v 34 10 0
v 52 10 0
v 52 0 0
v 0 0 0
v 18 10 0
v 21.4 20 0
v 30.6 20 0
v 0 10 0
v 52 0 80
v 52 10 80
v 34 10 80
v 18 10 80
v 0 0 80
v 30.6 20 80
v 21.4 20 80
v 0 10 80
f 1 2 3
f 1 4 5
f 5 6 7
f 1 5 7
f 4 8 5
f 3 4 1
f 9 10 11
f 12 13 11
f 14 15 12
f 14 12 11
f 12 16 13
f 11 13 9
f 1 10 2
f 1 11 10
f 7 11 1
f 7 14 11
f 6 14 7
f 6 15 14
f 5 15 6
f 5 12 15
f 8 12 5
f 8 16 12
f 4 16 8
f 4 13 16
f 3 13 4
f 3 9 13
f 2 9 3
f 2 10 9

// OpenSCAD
$fn = 32;

// ----------------------------------------------------------------------
// V guide rail: dovetail, 52 mm wide
// ----------------------------------------------------------------------

// --- parameters (mm) ---
rail_w = 52;              // rail width, X
base_t = 10;              // base plate thickness
v_depth = 10;             // V feature depth / height
v_half_w = 8;             // half width of the V at the base face
plate_t = 80;             // rail length, Z (the extrusion height)
top_half_w = 4.6;         // half width at the dovetail top

dovetail_base = 2 * v_half_w;  // dovetail width at the base
dovetail_top = 2 * top_half_w;  // dovetail width at the top

profile = [[0, 0], [52, 0], [52, 10], [34, 10], [30.6, 20], [21.4, 20], [18, 10], [0, 10]];  // primary outline, 8 points, counter clockwise

// --- the one profile operation ---
linear_extrude(height = plate_t) polygon(points = profile);
